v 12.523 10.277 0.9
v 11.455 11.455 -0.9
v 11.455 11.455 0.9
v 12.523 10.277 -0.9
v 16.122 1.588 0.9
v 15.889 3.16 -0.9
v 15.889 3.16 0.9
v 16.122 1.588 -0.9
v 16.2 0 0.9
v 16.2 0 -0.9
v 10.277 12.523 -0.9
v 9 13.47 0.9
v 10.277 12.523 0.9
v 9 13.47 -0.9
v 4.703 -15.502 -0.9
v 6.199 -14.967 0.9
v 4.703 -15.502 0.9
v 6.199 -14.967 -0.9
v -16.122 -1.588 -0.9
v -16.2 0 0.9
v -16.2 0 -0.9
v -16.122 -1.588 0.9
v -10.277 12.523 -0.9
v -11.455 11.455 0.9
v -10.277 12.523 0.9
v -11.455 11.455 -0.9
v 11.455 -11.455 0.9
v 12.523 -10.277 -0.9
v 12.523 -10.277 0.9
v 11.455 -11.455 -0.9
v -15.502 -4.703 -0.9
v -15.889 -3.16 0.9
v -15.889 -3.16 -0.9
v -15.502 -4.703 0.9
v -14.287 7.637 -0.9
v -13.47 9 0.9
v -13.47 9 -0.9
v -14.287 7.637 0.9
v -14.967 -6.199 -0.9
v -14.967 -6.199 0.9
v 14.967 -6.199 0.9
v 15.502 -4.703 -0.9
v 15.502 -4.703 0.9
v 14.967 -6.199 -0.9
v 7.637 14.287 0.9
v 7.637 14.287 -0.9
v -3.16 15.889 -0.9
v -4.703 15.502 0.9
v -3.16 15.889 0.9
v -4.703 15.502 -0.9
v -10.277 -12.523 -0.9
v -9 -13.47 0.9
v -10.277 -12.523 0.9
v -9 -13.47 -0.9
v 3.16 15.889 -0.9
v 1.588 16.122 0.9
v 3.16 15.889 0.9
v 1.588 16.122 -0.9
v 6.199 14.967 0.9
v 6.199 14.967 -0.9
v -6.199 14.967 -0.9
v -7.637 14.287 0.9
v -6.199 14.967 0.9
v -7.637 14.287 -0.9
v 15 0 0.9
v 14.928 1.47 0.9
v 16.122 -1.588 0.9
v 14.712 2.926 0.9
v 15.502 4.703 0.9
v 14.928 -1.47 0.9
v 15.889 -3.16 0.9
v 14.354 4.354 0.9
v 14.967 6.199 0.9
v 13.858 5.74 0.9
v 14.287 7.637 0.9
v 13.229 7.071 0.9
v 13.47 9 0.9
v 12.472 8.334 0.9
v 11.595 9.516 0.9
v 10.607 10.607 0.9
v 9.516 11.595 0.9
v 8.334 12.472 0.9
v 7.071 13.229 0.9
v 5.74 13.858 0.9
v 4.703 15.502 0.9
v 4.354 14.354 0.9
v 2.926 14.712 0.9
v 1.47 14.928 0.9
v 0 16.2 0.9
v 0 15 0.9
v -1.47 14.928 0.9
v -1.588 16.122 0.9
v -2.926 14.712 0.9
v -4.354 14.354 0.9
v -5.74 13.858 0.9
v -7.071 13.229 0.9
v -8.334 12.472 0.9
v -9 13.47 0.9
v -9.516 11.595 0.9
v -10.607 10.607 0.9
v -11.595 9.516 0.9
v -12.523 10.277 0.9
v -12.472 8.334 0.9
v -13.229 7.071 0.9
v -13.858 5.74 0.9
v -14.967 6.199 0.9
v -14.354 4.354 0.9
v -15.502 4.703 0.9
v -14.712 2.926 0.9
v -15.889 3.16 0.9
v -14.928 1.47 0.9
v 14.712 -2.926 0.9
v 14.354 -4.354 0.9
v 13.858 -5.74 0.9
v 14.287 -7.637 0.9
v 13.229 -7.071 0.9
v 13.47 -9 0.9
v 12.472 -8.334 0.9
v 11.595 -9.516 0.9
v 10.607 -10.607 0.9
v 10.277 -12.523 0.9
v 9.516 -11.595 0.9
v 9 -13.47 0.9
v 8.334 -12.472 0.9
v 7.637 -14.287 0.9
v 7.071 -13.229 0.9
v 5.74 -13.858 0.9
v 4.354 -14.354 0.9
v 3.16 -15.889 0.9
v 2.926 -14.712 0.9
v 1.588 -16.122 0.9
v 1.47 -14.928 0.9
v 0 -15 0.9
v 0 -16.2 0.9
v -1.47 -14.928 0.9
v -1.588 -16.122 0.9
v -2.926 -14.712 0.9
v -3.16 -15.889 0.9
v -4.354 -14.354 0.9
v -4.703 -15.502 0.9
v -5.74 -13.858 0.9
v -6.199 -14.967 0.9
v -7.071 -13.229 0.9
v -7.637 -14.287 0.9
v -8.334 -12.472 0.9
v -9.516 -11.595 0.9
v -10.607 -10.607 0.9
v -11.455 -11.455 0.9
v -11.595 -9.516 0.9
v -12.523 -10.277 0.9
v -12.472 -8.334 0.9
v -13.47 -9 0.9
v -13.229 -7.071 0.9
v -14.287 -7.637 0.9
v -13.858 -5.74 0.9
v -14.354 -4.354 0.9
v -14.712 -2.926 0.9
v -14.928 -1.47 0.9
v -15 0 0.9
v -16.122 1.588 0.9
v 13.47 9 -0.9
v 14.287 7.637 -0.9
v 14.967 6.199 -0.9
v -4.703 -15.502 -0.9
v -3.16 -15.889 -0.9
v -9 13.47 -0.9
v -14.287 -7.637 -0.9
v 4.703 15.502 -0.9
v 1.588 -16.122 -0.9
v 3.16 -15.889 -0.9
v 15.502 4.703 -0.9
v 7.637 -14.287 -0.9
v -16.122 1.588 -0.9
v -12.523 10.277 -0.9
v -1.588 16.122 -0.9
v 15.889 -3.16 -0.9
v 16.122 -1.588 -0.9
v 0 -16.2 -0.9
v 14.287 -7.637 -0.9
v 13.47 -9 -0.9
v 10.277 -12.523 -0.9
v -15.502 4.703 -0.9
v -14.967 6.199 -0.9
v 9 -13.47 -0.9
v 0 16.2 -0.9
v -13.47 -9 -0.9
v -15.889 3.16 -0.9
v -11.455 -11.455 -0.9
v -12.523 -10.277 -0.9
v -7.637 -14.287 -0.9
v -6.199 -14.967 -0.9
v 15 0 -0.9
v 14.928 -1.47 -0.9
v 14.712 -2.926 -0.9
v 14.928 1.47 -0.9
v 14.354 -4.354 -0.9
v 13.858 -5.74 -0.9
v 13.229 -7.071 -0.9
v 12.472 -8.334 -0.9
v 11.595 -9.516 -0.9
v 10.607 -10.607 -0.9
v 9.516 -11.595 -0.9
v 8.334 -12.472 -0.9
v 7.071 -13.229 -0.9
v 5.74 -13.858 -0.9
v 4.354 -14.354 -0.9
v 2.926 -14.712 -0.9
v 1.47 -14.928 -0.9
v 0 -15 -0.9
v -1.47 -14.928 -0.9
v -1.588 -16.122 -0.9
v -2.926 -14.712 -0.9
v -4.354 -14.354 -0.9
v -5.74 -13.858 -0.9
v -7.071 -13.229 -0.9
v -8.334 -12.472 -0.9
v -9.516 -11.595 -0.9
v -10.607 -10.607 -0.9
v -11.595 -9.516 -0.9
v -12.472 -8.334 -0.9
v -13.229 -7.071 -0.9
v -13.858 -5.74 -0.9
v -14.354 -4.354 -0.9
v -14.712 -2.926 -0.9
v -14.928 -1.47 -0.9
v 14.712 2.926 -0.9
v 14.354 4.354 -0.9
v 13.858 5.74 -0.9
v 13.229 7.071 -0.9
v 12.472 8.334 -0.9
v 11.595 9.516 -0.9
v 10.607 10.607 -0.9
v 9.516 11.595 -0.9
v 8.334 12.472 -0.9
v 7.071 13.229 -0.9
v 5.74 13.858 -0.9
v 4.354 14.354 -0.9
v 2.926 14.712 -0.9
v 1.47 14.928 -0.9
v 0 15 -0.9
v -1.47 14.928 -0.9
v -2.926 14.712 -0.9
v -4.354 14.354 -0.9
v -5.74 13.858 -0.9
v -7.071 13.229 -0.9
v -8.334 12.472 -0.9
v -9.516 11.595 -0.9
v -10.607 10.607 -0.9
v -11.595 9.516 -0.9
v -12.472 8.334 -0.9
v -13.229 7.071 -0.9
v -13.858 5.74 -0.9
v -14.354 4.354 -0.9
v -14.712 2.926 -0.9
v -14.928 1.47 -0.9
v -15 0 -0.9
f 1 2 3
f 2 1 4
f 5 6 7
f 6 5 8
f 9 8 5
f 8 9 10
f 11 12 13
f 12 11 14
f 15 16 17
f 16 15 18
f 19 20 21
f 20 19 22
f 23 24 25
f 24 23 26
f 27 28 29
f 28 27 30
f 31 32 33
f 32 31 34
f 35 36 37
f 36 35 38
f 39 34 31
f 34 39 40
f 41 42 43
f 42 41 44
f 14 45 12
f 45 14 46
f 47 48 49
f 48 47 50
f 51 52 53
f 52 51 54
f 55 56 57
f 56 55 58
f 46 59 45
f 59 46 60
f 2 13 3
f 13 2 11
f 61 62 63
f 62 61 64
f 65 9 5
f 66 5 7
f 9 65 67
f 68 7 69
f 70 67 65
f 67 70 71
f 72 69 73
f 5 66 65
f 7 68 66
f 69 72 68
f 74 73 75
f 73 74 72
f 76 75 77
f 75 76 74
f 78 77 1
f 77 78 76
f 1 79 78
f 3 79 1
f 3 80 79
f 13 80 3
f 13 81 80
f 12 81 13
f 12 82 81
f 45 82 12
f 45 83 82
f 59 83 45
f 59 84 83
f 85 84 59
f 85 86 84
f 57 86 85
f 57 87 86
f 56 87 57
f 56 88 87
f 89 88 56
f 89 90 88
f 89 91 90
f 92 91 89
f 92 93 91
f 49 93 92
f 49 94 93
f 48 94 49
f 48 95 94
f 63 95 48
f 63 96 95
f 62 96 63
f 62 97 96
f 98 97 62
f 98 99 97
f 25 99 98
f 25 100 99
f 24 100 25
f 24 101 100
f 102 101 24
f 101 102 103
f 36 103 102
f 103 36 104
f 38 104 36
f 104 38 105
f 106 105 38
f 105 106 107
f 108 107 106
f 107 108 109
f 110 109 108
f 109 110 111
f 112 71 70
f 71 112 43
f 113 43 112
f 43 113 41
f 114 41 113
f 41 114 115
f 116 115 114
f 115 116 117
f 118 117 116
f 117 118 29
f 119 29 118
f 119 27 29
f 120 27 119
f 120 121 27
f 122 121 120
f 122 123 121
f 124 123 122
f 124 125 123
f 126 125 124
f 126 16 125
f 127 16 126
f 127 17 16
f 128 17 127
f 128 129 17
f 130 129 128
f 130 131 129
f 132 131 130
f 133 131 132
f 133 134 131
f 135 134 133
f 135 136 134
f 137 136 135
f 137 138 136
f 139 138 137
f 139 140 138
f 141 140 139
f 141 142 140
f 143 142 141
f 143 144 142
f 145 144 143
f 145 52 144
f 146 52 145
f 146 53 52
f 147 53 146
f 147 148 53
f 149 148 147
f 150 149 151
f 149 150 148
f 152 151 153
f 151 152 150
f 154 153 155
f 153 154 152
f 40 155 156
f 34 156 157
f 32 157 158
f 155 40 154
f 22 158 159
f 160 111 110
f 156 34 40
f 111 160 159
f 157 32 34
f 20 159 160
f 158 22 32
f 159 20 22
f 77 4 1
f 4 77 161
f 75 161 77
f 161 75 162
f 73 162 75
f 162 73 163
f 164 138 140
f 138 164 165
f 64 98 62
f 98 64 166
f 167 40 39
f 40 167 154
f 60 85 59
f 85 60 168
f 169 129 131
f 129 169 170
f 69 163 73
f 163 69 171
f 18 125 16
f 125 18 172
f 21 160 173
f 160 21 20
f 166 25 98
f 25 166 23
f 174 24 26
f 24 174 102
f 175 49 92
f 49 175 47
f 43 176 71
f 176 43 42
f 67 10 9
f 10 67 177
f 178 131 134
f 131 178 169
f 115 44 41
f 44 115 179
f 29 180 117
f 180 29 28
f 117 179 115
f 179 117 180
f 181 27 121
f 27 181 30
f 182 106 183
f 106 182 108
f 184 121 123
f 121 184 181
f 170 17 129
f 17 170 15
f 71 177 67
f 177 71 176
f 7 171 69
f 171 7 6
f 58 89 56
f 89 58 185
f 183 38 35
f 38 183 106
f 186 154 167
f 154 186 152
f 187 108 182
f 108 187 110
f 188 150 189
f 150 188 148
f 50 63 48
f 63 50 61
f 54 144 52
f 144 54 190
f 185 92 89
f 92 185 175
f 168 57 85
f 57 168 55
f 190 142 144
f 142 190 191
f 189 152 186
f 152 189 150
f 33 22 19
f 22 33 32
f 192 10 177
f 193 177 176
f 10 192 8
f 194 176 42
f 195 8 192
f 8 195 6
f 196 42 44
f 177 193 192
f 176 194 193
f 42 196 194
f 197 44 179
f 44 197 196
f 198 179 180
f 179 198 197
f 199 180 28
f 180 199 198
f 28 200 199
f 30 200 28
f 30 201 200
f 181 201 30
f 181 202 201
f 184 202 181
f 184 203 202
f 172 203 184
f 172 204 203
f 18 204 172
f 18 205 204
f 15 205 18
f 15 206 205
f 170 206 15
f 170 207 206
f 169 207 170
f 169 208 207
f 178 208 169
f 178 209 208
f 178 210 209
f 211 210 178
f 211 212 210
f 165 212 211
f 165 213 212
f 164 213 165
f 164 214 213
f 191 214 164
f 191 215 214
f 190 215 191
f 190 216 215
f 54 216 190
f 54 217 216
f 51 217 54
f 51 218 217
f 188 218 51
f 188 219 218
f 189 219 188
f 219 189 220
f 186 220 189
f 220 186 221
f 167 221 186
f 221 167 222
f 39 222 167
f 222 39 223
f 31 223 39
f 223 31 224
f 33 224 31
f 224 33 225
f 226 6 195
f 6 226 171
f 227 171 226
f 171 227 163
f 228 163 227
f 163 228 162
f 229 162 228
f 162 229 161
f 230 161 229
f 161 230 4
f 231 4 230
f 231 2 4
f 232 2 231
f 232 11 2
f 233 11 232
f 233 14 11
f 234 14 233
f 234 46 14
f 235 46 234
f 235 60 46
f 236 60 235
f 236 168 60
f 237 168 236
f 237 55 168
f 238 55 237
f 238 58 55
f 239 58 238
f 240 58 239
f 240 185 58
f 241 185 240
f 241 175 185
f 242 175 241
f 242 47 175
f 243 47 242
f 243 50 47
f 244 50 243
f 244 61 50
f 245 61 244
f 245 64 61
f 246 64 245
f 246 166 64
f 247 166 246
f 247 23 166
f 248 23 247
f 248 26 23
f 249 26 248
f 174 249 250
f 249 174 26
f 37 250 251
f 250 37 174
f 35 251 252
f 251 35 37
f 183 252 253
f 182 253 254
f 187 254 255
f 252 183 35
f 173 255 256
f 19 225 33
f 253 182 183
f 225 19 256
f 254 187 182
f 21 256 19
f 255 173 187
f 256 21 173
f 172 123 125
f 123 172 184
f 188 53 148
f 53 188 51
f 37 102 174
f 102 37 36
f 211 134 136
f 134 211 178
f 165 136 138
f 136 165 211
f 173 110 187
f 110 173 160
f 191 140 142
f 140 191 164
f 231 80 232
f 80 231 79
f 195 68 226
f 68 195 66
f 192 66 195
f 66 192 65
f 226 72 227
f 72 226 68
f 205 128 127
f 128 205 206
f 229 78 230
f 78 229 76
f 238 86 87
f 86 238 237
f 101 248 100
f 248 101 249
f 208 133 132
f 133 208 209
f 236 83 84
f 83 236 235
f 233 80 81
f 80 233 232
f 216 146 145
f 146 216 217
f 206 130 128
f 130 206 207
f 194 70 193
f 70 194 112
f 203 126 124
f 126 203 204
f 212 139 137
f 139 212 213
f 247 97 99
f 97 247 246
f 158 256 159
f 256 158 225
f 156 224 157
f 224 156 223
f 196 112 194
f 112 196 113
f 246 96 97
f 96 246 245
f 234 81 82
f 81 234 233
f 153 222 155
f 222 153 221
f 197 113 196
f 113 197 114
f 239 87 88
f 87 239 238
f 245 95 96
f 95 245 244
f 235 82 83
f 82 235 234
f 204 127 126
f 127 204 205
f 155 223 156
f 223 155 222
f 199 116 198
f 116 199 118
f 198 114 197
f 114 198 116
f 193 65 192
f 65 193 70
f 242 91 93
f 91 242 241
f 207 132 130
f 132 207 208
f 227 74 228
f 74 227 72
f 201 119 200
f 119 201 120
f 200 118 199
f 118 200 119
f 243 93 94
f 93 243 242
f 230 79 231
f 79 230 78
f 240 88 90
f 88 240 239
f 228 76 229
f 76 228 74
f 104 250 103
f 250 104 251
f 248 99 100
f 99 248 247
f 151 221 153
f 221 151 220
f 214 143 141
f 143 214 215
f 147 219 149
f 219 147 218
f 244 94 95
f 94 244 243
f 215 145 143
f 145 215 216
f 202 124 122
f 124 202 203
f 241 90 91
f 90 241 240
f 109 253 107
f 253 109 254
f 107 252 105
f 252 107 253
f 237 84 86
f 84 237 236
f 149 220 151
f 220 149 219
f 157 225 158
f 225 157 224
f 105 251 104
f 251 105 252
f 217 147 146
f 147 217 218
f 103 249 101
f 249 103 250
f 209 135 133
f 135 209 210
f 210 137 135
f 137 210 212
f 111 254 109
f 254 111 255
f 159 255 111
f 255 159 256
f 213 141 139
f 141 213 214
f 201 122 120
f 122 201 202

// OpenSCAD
/******************************************************************
*                                                                 *
* OpenFlexure Microscope: actuator tension band                   *
*                                                                 *
* The microscope stage actuators need a tension band to provide a *
* reciprocal force between the captive nut in the gear and the    *
* stage arm. The recommendation is to use a Viton O-ring, but if  *
* you have a 3d printer can reliably print with TPU filament, you *
* can print this instead and use it in place of the O-ring.       *
*                                                                 *
* Print this part using .1mm layer height, with randomized        *
* perimeter start and end positions if possible. For strength,    *
* The part should be printed entirely with perimeters, no gap     *
* fill. The part is designed to be printed with a 0.4mm nozzle.   *
* Printing with a 1mm nozzle hasn't been tested, and isn't        *
* recommended. 
*                                                                 *
* (c) Bill Schaller, June 2020                                    *
* Released under the CERN Open Hardware License v1.2              *
*                                                                 *
******************************************************************/

/**************
 * PARAMETERS *
 **************/
$fn = 64;
nozzle_width = 0.4;
band_height = 1.8;
ideal_band_thickness = 1.5;
band_inner_diameter = 30;

/*********
 * MODEL *
 *********/
actual_band_thickness = 
    ideal_band_thickness - (ideal_band_thickness % nozzle_width);
band_outer_diameter = band_inner_diameter + actual_band_thickness * 2;

difference(){
    cylinder(h=band_height, d=band_outer_diameter, center = true);
    cylinder(h=band_height+1, d=band_inner_diameter, center = true);
}
